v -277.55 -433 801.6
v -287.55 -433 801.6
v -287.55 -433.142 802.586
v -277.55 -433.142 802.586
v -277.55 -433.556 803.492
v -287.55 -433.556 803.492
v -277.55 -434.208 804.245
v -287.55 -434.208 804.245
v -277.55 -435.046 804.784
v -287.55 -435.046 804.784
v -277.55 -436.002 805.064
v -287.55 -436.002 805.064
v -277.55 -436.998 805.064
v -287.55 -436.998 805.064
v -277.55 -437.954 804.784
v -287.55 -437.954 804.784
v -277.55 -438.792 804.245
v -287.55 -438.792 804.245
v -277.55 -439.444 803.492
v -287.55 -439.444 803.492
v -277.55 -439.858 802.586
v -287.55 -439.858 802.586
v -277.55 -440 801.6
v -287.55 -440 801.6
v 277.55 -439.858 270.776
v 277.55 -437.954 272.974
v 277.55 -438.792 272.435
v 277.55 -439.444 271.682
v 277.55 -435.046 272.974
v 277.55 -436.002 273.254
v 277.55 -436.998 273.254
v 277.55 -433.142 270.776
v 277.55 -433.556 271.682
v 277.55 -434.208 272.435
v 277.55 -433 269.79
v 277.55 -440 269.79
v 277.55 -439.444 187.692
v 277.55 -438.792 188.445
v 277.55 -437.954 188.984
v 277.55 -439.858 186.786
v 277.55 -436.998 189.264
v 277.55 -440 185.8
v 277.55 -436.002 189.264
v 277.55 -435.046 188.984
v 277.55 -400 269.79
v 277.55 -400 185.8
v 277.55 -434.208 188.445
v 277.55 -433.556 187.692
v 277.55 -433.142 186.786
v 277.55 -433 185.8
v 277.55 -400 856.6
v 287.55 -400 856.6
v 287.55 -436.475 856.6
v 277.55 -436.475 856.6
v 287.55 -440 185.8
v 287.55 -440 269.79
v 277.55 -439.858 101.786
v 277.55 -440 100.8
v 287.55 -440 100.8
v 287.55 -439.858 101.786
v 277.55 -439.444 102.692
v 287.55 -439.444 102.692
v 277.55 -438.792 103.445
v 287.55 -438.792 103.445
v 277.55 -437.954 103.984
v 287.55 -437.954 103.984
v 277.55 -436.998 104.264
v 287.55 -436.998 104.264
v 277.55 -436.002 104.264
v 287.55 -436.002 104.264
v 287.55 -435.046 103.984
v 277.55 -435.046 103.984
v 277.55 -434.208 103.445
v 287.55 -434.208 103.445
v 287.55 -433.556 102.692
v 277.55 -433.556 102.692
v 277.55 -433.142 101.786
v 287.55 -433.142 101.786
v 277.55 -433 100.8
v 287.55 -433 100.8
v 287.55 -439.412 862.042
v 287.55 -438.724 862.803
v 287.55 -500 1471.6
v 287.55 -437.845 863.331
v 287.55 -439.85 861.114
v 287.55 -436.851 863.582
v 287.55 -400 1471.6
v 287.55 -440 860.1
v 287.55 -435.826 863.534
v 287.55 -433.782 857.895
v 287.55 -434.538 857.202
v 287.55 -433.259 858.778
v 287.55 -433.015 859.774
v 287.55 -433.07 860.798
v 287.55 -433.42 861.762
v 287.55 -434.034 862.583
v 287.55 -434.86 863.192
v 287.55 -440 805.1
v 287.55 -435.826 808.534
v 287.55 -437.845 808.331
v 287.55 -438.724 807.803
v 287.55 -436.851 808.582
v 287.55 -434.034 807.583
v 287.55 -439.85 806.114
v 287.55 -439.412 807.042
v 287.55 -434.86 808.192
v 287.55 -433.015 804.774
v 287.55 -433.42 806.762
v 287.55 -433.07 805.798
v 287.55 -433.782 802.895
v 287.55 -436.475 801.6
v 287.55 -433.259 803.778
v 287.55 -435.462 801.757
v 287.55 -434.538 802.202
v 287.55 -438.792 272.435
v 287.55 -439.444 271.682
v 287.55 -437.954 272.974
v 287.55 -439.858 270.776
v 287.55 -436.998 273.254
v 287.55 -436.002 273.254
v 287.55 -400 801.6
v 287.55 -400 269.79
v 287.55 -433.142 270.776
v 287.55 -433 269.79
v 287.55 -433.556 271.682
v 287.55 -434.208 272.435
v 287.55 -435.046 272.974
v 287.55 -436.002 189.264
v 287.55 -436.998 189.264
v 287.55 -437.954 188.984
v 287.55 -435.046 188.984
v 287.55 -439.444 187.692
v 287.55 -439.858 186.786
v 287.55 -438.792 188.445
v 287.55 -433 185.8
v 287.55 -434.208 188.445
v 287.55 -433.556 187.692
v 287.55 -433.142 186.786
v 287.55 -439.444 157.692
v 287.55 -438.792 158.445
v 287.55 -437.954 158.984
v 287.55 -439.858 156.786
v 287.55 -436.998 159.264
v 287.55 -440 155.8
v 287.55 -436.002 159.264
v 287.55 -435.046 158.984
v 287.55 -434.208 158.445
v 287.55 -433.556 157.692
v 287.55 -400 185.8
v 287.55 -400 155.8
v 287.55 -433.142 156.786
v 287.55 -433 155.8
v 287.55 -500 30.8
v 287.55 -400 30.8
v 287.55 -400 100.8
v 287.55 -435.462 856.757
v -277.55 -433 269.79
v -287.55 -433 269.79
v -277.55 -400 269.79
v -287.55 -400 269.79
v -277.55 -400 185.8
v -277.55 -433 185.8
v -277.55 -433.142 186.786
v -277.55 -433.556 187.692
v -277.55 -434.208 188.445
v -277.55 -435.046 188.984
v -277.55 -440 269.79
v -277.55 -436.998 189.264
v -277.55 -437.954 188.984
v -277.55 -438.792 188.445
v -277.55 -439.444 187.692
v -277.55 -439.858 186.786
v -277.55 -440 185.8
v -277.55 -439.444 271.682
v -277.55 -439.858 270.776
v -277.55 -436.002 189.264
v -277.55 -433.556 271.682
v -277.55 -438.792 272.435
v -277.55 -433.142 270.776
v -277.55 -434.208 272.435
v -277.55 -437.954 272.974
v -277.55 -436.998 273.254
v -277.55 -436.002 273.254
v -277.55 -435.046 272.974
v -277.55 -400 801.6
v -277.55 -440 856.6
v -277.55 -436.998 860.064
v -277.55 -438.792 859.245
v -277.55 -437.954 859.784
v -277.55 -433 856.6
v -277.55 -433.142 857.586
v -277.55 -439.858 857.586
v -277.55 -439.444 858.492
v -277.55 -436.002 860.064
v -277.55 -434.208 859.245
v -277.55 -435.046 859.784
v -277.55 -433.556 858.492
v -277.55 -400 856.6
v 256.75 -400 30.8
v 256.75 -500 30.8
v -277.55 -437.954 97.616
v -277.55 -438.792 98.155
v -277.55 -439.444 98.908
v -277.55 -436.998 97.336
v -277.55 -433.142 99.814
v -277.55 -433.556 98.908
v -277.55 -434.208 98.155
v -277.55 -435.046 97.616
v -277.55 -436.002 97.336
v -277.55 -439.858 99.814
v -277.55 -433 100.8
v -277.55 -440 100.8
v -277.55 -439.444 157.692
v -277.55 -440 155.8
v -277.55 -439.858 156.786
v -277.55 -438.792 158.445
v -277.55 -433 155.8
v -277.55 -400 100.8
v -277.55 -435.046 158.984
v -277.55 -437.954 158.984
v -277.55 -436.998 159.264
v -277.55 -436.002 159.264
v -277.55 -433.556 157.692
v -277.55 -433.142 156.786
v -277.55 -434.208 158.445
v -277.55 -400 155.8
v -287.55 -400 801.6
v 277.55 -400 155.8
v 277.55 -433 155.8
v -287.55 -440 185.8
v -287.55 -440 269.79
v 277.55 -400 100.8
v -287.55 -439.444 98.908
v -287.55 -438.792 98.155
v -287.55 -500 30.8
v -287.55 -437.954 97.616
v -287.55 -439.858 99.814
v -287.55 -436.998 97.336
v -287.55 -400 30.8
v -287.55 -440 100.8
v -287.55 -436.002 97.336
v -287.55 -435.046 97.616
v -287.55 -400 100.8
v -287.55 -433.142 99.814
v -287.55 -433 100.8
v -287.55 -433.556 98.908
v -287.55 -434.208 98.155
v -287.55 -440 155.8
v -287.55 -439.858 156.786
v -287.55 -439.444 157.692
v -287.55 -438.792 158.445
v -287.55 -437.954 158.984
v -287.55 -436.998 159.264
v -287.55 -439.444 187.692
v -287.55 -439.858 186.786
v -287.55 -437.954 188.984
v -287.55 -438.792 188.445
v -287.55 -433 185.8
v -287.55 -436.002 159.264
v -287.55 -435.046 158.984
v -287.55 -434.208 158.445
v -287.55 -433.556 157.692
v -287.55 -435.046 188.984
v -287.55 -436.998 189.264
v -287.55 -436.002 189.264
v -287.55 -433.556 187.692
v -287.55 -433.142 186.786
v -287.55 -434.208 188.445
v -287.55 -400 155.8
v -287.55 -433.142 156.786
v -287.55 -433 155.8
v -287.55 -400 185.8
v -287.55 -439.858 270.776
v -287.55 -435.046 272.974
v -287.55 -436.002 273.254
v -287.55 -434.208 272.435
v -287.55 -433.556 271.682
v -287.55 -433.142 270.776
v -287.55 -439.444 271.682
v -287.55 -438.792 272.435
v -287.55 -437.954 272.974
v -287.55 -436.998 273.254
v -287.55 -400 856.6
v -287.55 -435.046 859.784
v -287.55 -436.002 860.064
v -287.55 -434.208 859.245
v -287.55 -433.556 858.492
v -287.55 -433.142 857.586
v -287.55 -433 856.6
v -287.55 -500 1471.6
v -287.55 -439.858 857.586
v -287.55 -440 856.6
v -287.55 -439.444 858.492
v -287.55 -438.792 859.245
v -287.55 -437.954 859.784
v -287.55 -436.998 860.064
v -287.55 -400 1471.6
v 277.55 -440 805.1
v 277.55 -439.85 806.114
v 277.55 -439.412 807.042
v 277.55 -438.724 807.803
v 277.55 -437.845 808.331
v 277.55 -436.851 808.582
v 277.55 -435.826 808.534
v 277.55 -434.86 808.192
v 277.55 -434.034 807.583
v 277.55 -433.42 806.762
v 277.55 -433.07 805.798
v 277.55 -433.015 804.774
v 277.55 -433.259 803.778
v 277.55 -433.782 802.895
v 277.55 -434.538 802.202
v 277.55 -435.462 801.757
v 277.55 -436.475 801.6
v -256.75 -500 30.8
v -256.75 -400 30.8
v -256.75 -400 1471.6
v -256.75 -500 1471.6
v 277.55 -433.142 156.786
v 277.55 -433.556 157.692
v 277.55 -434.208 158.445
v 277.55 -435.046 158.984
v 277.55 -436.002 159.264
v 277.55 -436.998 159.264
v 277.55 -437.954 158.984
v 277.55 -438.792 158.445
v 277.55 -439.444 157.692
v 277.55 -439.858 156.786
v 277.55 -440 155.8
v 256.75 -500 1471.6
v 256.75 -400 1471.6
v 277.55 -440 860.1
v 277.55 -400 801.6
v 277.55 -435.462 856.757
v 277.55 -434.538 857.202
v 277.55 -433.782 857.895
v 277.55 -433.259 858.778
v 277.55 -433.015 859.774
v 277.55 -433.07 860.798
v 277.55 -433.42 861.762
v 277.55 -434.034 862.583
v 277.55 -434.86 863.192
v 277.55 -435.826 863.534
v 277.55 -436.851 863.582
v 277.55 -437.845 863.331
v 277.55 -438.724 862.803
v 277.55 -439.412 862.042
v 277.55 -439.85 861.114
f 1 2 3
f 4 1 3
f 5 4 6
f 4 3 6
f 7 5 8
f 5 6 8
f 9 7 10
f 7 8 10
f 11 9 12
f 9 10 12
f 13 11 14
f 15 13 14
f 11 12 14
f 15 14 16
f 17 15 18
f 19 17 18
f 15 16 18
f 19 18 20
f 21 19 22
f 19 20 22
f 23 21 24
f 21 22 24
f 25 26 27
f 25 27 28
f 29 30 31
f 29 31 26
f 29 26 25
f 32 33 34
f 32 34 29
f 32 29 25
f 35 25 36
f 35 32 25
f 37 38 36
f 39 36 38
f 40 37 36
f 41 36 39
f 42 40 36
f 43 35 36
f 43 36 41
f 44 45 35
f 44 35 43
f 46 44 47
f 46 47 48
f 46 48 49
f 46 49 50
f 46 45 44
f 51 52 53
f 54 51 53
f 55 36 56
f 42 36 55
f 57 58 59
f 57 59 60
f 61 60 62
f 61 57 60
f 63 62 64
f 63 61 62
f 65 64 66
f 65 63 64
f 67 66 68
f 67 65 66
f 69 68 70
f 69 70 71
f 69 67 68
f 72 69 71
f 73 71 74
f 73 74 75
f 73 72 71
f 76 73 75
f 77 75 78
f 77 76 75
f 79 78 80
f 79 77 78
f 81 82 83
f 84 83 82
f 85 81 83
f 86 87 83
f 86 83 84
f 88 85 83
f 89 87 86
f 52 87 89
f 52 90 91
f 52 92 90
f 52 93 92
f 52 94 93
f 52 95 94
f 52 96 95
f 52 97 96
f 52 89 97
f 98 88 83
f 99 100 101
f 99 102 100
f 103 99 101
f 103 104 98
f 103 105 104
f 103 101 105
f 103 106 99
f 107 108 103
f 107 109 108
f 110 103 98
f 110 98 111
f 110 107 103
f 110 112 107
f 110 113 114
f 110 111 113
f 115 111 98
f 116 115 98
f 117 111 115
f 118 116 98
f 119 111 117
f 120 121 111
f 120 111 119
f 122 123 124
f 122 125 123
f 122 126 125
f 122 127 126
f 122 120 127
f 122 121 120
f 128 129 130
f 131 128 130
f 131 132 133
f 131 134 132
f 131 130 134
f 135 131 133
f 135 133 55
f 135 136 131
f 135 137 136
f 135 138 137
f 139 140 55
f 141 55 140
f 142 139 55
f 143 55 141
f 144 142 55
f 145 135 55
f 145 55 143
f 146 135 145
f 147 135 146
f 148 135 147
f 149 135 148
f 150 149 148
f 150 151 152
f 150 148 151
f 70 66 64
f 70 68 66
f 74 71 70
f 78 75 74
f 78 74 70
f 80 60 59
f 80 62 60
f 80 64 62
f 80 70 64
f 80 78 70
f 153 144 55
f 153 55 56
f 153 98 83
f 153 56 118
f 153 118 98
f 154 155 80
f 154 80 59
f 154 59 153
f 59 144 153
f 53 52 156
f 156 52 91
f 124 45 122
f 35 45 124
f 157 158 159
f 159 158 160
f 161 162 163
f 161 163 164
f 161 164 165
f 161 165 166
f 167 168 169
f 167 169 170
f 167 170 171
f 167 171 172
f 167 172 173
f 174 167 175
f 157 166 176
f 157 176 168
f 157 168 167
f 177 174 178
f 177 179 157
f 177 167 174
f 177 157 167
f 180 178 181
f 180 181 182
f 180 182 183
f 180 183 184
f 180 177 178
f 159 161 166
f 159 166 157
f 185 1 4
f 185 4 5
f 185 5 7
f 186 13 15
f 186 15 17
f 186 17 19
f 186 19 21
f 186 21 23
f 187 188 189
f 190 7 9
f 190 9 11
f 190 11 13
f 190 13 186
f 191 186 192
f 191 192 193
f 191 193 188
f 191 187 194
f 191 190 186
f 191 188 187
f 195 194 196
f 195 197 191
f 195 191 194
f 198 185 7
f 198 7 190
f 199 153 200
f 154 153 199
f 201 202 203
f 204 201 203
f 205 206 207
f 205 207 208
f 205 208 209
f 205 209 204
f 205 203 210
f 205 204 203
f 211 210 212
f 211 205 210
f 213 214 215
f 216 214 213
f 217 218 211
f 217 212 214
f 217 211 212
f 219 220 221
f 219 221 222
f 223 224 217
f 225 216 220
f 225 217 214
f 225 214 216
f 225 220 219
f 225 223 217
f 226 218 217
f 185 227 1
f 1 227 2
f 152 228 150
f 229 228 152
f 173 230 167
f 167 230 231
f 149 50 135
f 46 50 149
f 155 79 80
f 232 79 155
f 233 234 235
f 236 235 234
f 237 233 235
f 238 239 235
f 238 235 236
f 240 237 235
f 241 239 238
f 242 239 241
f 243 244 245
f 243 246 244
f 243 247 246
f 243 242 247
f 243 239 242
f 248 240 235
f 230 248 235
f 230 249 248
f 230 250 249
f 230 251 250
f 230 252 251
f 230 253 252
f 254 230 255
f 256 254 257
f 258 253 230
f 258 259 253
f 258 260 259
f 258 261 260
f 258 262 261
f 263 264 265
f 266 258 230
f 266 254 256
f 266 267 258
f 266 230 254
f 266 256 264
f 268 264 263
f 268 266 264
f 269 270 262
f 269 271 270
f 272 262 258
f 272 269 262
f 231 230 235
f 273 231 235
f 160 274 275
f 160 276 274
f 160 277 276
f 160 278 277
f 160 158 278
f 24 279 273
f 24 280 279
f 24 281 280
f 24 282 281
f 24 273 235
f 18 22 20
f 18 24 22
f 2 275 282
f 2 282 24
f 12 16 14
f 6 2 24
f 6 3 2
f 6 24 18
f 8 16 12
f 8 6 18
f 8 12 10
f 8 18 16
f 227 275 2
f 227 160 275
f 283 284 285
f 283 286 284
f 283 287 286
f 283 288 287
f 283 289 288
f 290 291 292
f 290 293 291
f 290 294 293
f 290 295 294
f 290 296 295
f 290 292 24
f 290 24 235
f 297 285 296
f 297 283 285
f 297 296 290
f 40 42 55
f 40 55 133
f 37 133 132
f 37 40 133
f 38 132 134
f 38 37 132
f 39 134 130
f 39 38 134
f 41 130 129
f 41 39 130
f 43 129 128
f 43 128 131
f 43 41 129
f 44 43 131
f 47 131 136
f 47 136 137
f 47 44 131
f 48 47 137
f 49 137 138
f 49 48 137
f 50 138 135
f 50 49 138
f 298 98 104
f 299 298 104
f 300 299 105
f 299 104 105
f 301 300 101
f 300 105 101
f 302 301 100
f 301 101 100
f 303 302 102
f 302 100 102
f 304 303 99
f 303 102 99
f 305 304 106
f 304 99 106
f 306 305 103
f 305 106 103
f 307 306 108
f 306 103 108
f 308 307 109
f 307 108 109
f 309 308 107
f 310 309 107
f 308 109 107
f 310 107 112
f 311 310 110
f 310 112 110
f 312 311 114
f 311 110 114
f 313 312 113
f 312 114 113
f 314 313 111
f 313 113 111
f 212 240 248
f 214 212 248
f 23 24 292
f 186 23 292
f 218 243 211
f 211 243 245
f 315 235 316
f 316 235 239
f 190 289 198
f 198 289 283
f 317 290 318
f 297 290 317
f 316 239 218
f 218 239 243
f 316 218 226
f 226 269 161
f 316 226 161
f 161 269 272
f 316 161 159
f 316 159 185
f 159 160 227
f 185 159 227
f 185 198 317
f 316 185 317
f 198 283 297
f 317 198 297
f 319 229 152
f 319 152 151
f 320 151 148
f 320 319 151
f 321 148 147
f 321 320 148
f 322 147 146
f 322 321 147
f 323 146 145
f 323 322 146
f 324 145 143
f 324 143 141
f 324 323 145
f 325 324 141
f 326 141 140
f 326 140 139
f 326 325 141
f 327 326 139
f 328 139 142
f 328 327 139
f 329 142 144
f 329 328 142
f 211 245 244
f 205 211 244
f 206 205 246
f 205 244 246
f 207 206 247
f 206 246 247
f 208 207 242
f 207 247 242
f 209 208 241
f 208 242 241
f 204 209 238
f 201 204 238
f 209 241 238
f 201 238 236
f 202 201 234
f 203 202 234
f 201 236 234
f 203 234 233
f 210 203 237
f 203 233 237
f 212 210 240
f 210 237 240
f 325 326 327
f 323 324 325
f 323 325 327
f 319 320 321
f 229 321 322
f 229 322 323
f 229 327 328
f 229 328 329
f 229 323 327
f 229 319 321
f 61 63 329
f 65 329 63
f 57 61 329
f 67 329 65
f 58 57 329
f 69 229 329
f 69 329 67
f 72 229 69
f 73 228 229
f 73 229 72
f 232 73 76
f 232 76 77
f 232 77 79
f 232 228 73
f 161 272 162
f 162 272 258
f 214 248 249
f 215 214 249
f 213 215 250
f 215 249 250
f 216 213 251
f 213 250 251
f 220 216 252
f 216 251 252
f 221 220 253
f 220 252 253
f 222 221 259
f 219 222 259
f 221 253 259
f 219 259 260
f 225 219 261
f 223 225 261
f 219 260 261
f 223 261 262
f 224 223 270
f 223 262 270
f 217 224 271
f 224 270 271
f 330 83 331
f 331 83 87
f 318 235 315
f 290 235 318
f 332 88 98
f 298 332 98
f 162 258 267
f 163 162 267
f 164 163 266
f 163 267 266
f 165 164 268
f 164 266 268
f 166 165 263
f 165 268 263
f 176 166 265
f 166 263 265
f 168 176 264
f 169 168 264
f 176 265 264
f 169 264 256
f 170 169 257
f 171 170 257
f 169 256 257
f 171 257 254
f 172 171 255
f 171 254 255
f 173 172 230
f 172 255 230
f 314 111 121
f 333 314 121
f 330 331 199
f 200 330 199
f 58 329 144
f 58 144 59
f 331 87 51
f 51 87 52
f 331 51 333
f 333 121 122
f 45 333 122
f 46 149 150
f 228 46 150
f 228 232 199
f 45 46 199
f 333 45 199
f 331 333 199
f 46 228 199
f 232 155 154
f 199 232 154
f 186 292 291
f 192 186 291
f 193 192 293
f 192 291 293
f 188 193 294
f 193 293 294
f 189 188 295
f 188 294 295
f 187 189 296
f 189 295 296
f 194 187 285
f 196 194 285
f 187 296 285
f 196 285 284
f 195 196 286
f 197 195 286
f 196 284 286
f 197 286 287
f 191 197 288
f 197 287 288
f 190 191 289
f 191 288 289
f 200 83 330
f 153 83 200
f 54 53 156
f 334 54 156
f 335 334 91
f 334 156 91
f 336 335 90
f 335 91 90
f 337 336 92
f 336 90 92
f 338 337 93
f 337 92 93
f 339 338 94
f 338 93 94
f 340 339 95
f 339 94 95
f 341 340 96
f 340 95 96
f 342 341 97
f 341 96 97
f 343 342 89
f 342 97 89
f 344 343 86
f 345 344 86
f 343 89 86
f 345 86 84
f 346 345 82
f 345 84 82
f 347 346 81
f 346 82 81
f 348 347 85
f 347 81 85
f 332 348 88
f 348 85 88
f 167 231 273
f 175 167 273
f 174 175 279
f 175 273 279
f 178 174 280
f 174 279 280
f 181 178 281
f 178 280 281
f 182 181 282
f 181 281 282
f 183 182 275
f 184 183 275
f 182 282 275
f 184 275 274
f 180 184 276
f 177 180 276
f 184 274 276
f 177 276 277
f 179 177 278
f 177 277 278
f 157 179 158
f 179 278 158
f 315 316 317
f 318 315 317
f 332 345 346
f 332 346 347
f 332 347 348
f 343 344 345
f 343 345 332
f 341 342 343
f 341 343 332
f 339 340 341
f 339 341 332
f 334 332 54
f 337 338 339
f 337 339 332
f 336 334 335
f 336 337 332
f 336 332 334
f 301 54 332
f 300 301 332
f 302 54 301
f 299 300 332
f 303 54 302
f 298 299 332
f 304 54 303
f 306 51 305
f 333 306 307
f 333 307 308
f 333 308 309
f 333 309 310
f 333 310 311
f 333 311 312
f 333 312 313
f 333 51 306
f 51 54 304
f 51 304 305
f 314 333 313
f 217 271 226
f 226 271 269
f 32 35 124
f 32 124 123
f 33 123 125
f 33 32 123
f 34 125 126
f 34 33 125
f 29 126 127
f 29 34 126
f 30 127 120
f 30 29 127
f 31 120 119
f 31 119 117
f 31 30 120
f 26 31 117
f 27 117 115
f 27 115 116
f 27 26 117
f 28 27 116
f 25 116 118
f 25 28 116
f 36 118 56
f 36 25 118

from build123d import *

# Parameters (mm, degrees)
SKETCH8_W           = 1440.8
SKETCH8_H           = 100
BOSS_EXTRUDE2_DEPTH = 30.8
CUT_EXTRUDE4_DEPTH  = 10
CUT_EXTRUDE5_DEPTH  = 10
CUT_EXTRUDE6_DEPTH  = 10
SKETCH16_W          = 1440.8
SKETCH16_H          = 100
BOSS_EXTRUDE3_DEPTH = 30.8
CUT_EXTRUDE7_DEPTH  = 10
CUT_EXTRUDE8_START  = -10
CUT_EXTRUDE8_DEPTH  = 10
CUT_EXTRUDE9_START  = -10
CUT_EXTRUDE9_DEPTH  = 10


with BuildPart() as part:
    # Sketch8 → Boss-Extrude2 (new body)
    with BuildSketch(Plane.ZY.offset(287.55)):
        with Locations((751.2, -450)):
            Rectangle(SKETCH8_W, SKETCH8_H)
    extrude(amount=-BOSS_EXTRUDE2_DEPTH)

    # Sketch9 → Cut-Extrude4 (cut)
    with BuildSketch(Plane.ZY.offset(287.55)):
        with BuildLine():
            Line((155.8, -433), (155.8, -400))
            Line((155.8, -400), (100.8, -400))
            Line((100.8, -400), (100.8, -433))
            ThreePointArc((100.8, -433), (97.3, -436.5), (100.8, -440))
            Line((100.8, -440), (155.8, -440))
            ThreePointArc((155.8, -440), (159.3, -436.5), (155.8, -433))
        make_face()
    extrude(amount=-CUT_EXTRUDE4_DEPTH, mode=Mode.SUBTRACT)

    # Sketch10 → Cut-Extrude5 (cut)
    with BuildSketch(Plane.ZY.offset(287.55)):
        with BuildLine():
            Line((269.79, -433), (269.79, -400))
            Line((269.79, -400), (185.8, -400))
            Line((185.8, -400), (185.8, -433))
            ThreePointArc((185.8, -433), (189.3, -436.5), (185.8, -440))
            Line((185.8, -440), (269.79, -440))
            ThreePointArc((269.79, -440), (273.29, -436.5), (269.79, -433))
        make_face()
    extrude(amount=-CUT_EXTRUDE5_DEPTH, mode=Mode.SUBTRACT)

    # Sketch11 → Cut-Extrude6 (cut)
    with BuildSketch(Plane.ZY.offset(287.55)):
        with BuildLine():
            Line((856.6, -433), (856.6, -400))
            Line((856.6, -400), (801.6, -400))
            Line((801.6, -400), (801.6, -433))
            ThreePointArc((801.6, -433), (805.1, -436.5), (801.6, -440))
            Line((801.6, -440), (856.6, -440))
            ThreePointArc((856.6, -440), (860.1, -436.5), (856.6, -433))
        make_face()
    extrude(amount=-CUT_EXTRUDE6_DEPTH, mode=Mode.SUBTRACT)


with BuildPart() as body_2:
    # Sketch16 → Boss-Extrude3 (new body)
    with BuildSketch(Plane(origin=(287.55, 0, 0), x_dir=(0, 0, -1), z_dir=(1, 0, 0))):
        with Locations((-751.2, -450)):
            Rectangle(SKETCH16_W, SKETCH16_H)
    extrude(amount=-BOSS_EXTRUDE3_DEPTH)

    # Sketch17 → Cut-Extrude7 (cut)
    with BuildSketch(Plane(origin=(287.55, 0, 0), x_dir=(0, 0, -1), z_dir=(1, 0, 0))):
        with BuildLine():
            Line((-856.6, -400), (-856.6, -436.47546134))
            ThreePointArc((-856.6, -436.47546134), (-862.583448285, -434.033817252), (-860.099913978, -440))
            Line((-860.099913978, -440), (-805.099913978, -440))
            ThreePointArc((-805.099913978, -440), (-807.583448285, -434.033817252), (-801.6, -436.47546134))
            Line((-801.6, -436.47546134), (-801.6, -400))
            Line((-801.6, -400), (-856.6, -400))
        make_face()
    extrude(amount=-CUT_EXTRUDE7_DEPTH, mode=Mode.SUBTRACT)

    # Sketch18 → Cut-Extrude8 (cut)
    with BuildSketch(Plane(origin=(287.55, 0, 0), x_dir=(0, 0, -1), z_dir=(1, 0, 0)).offset(CUT_EXTRUDE8_START)):
        with BuildLine():
            Line((-269.79, -400), (-269.79, -433))
            ThreePointArc((-269.79, -433), (-273.29, -436.5), (-269.79, -440))
            Line((-269.79, -440), (-185.8, -440))
            ThreePointArc((-185.8, -440), (-189.3, -436.5), (-185.8, -433))
            Line((-185.8, -433), (-185.8, -400))
            Line((-185.8, -400), (-269.79, -400))
        make_face()
    extrude(amount=CUT_EXTRUDE8_DEPTH, mode=Mode.SUBTRACT)

    # Sketch19 → Cut-Extrude9 (cut)
    with BuildSketch(Plane(origin=(287.55, 0, 0), x_dir=(0, 0, -1), z_dir=(1, 0, 0)).offset(CUT_EXTRUDE9_START)):
        with BuildLine():
            Line((-155.8, -400), (-155.8, -433))
            ThreePointArc((-155.8, -433), (-159.3, -436.5), (-155.8, -440))
            Line((-155.8, -440), (-100.8, -440))
            ThreePointArc((-100.8, -440), (-104.3, -436.5), (-100.8, -433))
            Line((-100.8, -433), (-100.8, -400))
            Line((-100.8, -400), (-155.8, -400))
        make_face()
    extrude(amount=CUT_EXTRUDE9_DEPTH, mode=Mode.SUBTRACT)


solid = Compound([part.part, body_2.part])
